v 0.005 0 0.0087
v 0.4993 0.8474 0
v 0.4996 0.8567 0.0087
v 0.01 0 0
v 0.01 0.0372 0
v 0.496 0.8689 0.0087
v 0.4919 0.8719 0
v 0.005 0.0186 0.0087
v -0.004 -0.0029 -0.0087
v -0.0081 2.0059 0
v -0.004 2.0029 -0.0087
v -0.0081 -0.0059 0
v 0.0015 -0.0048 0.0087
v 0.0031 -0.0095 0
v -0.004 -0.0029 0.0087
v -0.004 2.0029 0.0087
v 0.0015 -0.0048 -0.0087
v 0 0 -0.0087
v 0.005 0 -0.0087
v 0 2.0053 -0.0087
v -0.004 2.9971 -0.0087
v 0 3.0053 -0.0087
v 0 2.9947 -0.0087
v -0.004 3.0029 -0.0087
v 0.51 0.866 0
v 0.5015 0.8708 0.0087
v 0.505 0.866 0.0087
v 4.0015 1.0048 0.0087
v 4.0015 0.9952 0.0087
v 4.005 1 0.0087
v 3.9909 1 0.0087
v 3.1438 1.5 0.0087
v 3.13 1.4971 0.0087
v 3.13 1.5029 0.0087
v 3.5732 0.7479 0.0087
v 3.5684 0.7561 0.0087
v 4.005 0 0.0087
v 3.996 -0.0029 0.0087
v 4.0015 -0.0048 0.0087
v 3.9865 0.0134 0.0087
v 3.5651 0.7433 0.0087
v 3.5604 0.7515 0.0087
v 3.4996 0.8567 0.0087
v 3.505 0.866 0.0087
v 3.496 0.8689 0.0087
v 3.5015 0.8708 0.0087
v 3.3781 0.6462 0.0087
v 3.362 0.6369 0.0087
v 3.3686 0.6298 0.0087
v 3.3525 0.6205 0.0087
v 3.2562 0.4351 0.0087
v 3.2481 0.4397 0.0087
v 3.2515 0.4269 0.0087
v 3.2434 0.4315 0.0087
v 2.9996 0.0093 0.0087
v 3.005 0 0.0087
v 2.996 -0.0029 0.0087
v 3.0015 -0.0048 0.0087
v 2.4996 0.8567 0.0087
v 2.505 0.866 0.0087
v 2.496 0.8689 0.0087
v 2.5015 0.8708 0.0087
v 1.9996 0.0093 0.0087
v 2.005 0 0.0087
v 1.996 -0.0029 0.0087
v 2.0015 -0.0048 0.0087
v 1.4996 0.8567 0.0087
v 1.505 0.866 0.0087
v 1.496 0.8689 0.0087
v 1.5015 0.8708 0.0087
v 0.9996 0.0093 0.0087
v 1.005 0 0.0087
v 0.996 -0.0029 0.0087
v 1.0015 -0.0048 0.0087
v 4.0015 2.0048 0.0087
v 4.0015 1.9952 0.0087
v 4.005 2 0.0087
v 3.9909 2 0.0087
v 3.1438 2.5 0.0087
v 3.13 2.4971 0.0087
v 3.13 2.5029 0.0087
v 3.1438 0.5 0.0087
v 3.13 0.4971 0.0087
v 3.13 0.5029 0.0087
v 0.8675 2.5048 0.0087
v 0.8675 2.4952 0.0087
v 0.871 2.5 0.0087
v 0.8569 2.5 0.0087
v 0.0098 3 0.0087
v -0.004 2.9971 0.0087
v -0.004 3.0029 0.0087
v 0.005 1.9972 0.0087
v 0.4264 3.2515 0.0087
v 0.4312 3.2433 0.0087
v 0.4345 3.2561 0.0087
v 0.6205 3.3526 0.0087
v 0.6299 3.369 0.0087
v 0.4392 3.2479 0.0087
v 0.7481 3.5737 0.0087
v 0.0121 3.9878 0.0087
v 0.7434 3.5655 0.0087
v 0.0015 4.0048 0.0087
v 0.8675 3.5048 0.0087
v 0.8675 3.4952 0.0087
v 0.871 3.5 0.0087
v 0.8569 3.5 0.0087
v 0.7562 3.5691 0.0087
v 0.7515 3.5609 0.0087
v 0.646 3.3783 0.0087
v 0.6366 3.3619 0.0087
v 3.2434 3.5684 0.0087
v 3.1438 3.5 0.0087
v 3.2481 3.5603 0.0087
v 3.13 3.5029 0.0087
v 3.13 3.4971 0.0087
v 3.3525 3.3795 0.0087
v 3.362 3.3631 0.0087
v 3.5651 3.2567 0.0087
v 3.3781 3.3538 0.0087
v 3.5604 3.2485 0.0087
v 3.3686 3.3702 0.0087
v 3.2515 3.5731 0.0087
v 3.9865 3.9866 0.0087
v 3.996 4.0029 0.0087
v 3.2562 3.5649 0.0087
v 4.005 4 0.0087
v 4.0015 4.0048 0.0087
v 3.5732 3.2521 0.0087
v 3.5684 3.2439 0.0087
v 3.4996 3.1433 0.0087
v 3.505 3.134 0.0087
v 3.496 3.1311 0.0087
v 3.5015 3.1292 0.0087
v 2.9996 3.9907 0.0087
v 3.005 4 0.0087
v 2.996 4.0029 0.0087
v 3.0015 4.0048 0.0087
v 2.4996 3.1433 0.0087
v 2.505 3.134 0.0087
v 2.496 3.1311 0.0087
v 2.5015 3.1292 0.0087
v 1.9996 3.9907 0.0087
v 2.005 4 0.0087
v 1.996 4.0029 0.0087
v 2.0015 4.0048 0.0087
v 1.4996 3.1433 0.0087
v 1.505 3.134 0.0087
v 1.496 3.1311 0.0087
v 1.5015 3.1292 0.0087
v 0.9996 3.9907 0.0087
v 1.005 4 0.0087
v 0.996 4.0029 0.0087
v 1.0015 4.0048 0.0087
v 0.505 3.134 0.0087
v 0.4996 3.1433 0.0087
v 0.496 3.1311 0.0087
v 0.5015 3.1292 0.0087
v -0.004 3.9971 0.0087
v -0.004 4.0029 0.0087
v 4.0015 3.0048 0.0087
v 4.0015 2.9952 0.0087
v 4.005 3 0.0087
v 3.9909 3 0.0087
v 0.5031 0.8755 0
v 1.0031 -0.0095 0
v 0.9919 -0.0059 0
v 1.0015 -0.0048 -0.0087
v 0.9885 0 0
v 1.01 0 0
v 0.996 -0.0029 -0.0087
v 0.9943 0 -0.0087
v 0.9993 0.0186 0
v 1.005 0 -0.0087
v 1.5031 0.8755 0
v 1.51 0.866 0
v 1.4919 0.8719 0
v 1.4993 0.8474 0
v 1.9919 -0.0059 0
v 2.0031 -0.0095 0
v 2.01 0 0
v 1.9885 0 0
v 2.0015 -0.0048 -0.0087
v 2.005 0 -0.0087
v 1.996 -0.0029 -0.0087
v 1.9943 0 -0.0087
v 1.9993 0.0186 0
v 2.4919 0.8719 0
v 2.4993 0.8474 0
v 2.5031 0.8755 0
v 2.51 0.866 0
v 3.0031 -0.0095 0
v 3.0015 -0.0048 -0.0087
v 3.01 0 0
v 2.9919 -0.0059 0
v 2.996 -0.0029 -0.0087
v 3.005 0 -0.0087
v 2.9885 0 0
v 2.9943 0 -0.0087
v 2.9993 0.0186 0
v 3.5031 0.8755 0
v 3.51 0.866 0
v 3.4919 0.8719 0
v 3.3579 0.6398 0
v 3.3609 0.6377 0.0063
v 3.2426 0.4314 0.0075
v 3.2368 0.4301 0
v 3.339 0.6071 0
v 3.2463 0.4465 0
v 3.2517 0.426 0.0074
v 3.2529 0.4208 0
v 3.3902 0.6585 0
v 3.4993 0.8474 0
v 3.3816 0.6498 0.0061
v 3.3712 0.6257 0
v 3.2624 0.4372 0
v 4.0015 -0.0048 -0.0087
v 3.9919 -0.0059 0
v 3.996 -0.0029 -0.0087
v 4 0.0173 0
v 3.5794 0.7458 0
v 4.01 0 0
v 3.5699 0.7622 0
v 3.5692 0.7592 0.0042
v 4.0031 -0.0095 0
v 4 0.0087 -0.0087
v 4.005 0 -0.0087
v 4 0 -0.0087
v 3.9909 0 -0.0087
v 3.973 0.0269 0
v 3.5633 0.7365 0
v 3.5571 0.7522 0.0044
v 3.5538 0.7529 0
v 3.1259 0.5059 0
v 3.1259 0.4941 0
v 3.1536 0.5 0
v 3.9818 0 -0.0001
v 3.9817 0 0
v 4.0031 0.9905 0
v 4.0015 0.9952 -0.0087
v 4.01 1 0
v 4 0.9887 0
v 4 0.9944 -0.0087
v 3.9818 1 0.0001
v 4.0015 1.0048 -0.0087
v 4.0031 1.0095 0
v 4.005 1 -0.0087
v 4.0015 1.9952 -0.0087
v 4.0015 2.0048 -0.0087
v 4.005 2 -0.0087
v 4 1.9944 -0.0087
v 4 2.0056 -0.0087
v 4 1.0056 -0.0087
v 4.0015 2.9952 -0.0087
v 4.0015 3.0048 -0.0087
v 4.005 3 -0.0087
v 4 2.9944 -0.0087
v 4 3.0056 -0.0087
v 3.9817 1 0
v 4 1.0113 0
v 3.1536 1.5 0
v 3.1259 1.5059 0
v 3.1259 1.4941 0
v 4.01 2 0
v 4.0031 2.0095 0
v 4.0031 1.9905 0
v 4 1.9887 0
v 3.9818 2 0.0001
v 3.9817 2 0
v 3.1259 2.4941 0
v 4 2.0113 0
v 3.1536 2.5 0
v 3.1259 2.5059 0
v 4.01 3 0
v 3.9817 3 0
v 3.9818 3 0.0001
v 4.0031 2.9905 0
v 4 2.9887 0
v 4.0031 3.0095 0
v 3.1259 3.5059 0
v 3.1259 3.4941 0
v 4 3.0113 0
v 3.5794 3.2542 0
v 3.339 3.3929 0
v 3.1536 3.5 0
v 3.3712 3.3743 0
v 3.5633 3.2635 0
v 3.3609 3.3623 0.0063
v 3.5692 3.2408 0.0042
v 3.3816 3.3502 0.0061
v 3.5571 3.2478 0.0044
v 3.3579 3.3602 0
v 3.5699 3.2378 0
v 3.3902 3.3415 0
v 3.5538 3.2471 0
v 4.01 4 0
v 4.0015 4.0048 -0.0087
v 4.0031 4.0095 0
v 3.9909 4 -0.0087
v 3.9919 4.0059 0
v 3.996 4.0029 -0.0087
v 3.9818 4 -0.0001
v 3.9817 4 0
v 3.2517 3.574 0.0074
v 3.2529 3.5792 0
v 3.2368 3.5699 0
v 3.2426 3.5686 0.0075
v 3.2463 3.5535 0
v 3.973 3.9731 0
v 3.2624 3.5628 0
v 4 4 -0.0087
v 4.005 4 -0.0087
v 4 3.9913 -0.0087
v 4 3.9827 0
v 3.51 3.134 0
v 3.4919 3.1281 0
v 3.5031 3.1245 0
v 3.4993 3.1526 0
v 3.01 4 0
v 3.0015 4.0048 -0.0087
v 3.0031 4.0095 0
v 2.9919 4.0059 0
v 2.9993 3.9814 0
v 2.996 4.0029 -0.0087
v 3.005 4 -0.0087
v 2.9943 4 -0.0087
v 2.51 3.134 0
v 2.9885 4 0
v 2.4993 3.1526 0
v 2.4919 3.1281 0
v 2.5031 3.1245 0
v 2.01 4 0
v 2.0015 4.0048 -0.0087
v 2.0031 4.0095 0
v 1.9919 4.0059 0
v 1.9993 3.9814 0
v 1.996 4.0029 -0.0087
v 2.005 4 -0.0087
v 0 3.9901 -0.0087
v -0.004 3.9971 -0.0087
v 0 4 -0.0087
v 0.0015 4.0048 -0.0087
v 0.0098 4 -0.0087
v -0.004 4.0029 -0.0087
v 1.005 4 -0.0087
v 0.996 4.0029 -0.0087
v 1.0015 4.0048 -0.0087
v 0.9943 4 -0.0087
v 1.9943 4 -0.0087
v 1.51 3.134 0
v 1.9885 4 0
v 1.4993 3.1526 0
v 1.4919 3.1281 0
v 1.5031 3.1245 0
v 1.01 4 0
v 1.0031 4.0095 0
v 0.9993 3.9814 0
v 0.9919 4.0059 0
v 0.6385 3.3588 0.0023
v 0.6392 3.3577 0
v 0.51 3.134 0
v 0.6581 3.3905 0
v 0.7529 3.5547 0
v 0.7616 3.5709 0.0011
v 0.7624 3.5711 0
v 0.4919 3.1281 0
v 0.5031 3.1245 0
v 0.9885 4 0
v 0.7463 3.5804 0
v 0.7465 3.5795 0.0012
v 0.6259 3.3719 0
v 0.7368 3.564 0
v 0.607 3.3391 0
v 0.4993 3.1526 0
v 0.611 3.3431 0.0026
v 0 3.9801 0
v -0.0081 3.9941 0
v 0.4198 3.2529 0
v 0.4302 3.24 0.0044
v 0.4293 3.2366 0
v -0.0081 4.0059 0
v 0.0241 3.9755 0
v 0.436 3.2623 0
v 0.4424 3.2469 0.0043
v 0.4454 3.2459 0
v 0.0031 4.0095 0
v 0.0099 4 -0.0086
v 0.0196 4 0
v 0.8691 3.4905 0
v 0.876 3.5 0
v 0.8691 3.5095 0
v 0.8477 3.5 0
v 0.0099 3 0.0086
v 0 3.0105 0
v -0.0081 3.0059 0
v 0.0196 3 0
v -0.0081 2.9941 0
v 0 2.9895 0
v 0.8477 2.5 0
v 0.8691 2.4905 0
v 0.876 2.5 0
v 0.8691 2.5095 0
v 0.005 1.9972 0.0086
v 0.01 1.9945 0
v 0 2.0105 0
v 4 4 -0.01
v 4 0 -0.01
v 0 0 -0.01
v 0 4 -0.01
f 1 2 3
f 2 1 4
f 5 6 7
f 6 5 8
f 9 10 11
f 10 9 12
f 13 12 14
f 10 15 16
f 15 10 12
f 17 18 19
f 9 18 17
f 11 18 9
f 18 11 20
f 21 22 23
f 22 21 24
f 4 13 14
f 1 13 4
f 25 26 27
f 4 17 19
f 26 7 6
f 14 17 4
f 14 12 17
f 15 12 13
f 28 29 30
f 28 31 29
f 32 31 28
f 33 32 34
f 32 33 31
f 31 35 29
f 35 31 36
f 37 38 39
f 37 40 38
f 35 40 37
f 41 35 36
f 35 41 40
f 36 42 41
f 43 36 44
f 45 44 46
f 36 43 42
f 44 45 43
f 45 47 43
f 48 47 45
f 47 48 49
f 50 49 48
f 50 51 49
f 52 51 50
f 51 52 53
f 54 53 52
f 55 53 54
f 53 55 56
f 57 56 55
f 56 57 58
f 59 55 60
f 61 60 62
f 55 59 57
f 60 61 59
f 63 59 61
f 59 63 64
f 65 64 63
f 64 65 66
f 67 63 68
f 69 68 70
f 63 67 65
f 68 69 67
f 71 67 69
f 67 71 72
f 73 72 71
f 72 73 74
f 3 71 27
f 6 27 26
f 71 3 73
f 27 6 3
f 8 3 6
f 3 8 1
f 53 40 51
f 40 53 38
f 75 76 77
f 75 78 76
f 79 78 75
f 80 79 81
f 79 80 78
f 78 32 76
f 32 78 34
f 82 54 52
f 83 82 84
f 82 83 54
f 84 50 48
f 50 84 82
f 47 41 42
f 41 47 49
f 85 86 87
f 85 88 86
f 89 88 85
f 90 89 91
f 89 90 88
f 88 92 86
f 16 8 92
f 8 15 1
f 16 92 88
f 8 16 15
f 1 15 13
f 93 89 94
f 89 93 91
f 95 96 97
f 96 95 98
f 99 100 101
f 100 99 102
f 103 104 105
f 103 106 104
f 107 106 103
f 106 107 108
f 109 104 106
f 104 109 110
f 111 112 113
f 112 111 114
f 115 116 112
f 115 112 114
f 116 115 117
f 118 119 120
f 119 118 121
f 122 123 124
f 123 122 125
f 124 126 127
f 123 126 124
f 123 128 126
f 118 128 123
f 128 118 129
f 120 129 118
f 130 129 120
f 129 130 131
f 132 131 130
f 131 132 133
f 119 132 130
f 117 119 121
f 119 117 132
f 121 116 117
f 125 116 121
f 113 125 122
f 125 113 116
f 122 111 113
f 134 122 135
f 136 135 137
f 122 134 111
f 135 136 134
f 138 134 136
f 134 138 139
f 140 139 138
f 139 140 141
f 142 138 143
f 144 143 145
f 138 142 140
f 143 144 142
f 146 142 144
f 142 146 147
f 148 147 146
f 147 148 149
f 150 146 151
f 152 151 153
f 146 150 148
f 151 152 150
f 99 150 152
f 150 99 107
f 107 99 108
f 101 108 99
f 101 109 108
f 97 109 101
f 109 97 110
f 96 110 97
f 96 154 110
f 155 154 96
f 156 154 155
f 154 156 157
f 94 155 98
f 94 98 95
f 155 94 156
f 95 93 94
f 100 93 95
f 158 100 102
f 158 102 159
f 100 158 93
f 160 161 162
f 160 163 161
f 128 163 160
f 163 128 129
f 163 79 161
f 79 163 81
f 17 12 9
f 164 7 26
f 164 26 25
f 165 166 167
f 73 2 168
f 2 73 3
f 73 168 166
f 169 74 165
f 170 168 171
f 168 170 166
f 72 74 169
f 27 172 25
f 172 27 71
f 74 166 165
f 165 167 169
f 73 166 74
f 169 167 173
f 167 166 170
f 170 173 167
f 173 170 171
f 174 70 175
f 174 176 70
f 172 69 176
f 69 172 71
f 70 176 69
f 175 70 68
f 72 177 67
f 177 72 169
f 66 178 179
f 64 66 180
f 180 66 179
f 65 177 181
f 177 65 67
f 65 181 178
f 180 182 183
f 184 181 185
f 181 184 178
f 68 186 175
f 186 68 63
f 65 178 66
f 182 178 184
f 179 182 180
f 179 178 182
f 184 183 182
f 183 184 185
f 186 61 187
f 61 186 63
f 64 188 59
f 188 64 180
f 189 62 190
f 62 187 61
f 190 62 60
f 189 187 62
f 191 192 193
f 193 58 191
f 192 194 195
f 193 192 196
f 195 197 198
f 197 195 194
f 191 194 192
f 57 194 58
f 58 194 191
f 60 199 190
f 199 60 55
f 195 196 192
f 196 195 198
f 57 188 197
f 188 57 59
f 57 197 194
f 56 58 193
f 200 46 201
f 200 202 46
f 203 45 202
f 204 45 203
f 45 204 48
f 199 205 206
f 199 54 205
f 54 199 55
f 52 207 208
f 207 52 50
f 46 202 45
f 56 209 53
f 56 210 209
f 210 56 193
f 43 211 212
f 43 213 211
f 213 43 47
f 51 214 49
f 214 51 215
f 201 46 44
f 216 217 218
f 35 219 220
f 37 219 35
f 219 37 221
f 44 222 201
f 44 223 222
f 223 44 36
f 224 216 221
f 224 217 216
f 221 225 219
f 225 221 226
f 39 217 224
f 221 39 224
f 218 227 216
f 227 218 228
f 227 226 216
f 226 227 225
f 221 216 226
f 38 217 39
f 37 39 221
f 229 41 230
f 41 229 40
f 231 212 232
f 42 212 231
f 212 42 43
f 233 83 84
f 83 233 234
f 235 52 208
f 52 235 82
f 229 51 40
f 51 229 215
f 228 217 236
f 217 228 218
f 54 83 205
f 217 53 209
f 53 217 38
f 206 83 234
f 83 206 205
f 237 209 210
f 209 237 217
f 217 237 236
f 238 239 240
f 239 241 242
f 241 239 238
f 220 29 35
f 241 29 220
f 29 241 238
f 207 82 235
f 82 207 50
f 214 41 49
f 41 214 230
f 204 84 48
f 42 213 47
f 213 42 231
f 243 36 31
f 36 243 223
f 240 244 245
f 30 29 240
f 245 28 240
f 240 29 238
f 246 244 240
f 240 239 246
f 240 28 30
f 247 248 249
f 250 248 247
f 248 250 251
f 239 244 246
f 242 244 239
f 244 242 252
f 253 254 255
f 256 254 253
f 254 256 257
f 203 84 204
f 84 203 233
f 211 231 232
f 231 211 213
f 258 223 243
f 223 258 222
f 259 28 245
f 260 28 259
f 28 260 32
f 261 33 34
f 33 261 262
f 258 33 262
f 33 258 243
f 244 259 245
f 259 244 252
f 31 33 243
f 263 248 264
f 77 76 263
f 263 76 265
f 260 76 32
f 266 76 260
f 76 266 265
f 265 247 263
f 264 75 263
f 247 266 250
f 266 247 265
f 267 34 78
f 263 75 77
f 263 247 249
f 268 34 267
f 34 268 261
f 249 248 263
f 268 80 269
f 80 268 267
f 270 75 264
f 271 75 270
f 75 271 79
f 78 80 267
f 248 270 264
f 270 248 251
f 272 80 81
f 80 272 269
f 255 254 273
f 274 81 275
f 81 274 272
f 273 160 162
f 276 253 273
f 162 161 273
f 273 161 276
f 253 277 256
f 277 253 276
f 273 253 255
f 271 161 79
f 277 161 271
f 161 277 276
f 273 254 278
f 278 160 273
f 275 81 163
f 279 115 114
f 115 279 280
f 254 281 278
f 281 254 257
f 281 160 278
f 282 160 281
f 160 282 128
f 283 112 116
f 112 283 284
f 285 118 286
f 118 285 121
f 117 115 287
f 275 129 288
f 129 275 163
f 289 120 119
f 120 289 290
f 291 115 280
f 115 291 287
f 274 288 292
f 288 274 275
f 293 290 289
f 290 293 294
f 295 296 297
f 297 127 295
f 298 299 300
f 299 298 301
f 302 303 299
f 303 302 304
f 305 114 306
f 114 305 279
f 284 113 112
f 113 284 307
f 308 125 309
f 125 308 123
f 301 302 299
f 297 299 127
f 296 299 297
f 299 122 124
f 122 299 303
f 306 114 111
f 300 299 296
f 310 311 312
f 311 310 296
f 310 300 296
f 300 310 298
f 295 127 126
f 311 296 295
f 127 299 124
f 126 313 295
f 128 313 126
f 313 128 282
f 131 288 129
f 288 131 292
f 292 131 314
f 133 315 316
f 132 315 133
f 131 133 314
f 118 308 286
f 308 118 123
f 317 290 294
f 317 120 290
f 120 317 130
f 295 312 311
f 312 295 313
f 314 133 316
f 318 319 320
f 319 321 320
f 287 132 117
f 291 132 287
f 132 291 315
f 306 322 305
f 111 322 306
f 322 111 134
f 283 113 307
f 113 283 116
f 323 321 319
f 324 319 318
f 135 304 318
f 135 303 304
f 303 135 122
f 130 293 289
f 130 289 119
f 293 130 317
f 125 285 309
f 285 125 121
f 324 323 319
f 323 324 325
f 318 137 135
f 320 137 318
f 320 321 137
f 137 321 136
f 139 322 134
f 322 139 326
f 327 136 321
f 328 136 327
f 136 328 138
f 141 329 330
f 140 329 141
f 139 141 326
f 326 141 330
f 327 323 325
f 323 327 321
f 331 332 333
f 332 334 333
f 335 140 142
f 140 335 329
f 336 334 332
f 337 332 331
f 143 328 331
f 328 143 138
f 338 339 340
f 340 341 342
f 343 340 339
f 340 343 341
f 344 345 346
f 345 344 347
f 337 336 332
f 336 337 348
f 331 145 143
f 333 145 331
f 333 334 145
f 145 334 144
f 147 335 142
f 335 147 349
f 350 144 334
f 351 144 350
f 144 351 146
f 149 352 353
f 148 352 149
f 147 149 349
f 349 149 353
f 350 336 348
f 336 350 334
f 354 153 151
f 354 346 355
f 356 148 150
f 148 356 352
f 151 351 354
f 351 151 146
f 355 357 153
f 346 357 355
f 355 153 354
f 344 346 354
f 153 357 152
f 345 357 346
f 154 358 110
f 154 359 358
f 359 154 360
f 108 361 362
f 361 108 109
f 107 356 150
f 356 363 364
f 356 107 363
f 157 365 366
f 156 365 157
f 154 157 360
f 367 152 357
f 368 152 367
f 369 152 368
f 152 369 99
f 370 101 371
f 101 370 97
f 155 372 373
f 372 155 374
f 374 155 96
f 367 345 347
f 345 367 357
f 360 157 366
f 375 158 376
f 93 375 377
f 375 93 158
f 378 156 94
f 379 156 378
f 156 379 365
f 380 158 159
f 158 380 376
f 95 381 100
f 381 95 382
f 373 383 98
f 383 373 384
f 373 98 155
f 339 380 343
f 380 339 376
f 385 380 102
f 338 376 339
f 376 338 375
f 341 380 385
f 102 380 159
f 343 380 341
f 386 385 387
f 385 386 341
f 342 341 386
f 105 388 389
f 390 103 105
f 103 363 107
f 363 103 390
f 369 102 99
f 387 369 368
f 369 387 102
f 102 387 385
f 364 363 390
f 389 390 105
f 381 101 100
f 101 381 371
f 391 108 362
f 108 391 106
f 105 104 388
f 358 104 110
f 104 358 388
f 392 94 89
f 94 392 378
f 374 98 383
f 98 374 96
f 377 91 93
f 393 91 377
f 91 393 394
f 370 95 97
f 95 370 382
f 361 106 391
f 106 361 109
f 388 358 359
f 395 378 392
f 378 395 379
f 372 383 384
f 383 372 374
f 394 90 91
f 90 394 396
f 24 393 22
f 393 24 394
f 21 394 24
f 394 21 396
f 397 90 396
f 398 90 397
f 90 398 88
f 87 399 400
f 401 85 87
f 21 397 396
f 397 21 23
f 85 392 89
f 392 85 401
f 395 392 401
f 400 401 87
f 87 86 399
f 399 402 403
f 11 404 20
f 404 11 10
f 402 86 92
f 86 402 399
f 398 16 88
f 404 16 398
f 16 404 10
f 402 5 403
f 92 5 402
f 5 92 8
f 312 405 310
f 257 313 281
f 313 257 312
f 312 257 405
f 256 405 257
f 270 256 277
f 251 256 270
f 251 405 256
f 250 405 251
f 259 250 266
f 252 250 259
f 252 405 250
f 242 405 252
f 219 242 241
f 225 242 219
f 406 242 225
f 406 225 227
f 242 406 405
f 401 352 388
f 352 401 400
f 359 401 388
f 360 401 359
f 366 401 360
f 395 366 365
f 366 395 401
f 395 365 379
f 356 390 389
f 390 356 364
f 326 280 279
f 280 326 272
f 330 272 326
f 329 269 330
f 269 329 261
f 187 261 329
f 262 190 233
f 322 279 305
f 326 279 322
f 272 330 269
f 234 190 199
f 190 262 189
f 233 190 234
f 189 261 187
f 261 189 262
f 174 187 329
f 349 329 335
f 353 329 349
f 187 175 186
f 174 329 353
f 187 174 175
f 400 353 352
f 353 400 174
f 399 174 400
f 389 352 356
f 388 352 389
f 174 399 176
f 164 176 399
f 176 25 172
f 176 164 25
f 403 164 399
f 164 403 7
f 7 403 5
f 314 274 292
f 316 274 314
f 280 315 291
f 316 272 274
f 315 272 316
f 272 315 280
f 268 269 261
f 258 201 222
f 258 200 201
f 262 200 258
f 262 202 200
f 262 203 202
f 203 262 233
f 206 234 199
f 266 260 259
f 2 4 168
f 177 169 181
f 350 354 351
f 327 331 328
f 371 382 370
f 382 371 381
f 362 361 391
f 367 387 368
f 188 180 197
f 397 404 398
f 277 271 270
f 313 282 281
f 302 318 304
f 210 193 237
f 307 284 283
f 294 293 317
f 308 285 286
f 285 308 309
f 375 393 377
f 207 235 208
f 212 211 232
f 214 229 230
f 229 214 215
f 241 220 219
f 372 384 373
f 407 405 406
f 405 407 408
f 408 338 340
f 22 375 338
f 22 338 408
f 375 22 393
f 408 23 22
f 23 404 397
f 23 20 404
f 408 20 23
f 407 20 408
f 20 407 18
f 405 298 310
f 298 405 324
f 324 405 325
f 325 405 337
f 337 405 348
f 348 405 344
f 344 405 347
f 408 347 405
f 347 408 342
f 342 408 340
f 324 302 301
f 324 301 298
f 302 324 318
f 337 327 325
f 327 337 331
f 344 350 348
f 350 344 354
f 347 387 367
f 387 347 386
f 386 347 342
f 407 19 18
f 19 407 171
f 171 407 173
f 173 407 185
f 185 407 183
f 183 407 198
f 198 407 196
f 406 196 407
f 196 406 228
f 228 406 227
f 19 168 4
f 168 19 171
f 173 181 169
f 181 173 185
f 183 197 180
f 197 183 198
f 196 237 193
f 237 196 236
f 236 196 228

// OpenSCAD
hull(){
    translate([0.0, 0.0]) sphere(0.01);
    translate([0.5, 0.866]) sphere(0.01);
}
hull(){
    translate([0.5, 0.866]) sphere(0.01);
    translate([1.0, 0.0]) sphere(0.01);
}
hull(){
    translate([1.0, 0.0]) sphere(0.01);
    translate([1.5, 0.866]) sphere(0.01);
}
hull(){
    translate([1.5, 0.866]) sphere(0.01);
    translate([2.0, 0.0]) sphere(0.01);
}
hull(){
    translate([2.0, 0.0]) sphere(0.01);
    translate([2.5, 0.866]) sphere(0.01);
}
hull(){
    translate([2.5, 0.866]) sphere(0.01);
    translate([3.0, 0.0]) sphere(0.01);
}
hull(){
    translate([3.0, 0.0]) sphere(0.01);
    translate([3.5, 0.866]) sphere(0.01);
}
hull(){
    translate([3.5, 0.866]) sphere(0.01);
    translate([4.0, 0.0]) sphere(0.01);
}
hull(){
    translate([4.0, 0.0]) sphere(0.01);
    translate([3.134, 0.5]) sphere(0.01);
}
hull(){
    translate([3.134, 0.5]) sphere(0.01);
    translate([4.0, 1.0]) sphere(0.01);
}
hull(){
    translate([4.0, 1.0]) sphere(0.01);
    translate([3.134, 1.5]) sphere(0.01);
}
hull(){
    translate([3.134, 1.5]) sphere(0.01);
    translate([4.0, 2.0]) sphere(0.01);
}
hull(){
    translate([4.0, 2.0]) sphere(0.01);
    translate([3.134, 2.5]) sphere(0.01);
}
hull(){
    translate([3.134, 2.5]) sphere(0.01);
    translate([4.0, 3.0]) sphere(0.01);
}
hull(){
    translate([4.0, 3.0]) sphere(0.01);
    translate([3.134, 3.5]) sphere(0.01);
}
hull(){
    translate([3.134, 3.5]) sphere(0.01);
    translate([4.0, 4.0]) sphere(0.01);
}
hull(){
    translate([4.0, 4.0]) sphere(0.01);
    translate([3.5, 3.134]) sphere(0.01);
}
hull(){
    translate([3.5, 3.134]) sphere(0.01);
    translate([3.0, 4.0]) sphere(0.01);
}
hull(){
    translate([3.0, 4.0]) sphere(0.01);
    translate([2.5, 3.134]) sphere(0.01);
}
hull(){
    translate([2.5, 3.134]) sphere(0.01);
    translate([2.0, 4.0]) sphere(0.01);
}
hull(){
    translate([2.0, 4.0]) sphere(0.01);
    translate([1.5, 3.134]) sphere(0.01);
}
hull(){
    translate([1.5, 3.134]) sphere(0.01);
    translate([1.0, 4.0]) sphere(0.01);
}
hull(){
    translate([1.0, 4.0]) sphere(0.01);
    translate([0.5, 3.134]) sphere(0.01);
}
hull(){
    translate([0.5, 3.134]) sphere(0.01);
    translate([0.0, 4.0]) sphere(0.01);
}
hull(){
    translate([0.0, 4.0]) sphere(0.01);
    translate([0.866, 3.5]) sphere(0.01);
}
hull(){
    translate([0.866, 3.5]) sphere(0.01);
    translate([0.0, 3.0]) sphere(0.01);
}
hull(){
    translate([0.0, 3.0]) sphere(0.01);
    translate([0.866, 2.5]) sphere(0.01);
}
hull(){
    translate([0.866, 2.5]) sphere(0.01);
    translate([0.0, 2.0]) sphere(0.01);
}
hull(){
    translate([0.0, 2.0]) sphere(0.01);
    translate([0.0, 1.0]) sphere(0.01);
}
hull(){
    translate([0.0, 1.0]) sphere(0.01);
    translate([0.0, 0.0]) sphere(0.01);
}
translate([0,0,-0.01]) color([0.1,0.1,0.1]) cube([4,4,0.01]);
